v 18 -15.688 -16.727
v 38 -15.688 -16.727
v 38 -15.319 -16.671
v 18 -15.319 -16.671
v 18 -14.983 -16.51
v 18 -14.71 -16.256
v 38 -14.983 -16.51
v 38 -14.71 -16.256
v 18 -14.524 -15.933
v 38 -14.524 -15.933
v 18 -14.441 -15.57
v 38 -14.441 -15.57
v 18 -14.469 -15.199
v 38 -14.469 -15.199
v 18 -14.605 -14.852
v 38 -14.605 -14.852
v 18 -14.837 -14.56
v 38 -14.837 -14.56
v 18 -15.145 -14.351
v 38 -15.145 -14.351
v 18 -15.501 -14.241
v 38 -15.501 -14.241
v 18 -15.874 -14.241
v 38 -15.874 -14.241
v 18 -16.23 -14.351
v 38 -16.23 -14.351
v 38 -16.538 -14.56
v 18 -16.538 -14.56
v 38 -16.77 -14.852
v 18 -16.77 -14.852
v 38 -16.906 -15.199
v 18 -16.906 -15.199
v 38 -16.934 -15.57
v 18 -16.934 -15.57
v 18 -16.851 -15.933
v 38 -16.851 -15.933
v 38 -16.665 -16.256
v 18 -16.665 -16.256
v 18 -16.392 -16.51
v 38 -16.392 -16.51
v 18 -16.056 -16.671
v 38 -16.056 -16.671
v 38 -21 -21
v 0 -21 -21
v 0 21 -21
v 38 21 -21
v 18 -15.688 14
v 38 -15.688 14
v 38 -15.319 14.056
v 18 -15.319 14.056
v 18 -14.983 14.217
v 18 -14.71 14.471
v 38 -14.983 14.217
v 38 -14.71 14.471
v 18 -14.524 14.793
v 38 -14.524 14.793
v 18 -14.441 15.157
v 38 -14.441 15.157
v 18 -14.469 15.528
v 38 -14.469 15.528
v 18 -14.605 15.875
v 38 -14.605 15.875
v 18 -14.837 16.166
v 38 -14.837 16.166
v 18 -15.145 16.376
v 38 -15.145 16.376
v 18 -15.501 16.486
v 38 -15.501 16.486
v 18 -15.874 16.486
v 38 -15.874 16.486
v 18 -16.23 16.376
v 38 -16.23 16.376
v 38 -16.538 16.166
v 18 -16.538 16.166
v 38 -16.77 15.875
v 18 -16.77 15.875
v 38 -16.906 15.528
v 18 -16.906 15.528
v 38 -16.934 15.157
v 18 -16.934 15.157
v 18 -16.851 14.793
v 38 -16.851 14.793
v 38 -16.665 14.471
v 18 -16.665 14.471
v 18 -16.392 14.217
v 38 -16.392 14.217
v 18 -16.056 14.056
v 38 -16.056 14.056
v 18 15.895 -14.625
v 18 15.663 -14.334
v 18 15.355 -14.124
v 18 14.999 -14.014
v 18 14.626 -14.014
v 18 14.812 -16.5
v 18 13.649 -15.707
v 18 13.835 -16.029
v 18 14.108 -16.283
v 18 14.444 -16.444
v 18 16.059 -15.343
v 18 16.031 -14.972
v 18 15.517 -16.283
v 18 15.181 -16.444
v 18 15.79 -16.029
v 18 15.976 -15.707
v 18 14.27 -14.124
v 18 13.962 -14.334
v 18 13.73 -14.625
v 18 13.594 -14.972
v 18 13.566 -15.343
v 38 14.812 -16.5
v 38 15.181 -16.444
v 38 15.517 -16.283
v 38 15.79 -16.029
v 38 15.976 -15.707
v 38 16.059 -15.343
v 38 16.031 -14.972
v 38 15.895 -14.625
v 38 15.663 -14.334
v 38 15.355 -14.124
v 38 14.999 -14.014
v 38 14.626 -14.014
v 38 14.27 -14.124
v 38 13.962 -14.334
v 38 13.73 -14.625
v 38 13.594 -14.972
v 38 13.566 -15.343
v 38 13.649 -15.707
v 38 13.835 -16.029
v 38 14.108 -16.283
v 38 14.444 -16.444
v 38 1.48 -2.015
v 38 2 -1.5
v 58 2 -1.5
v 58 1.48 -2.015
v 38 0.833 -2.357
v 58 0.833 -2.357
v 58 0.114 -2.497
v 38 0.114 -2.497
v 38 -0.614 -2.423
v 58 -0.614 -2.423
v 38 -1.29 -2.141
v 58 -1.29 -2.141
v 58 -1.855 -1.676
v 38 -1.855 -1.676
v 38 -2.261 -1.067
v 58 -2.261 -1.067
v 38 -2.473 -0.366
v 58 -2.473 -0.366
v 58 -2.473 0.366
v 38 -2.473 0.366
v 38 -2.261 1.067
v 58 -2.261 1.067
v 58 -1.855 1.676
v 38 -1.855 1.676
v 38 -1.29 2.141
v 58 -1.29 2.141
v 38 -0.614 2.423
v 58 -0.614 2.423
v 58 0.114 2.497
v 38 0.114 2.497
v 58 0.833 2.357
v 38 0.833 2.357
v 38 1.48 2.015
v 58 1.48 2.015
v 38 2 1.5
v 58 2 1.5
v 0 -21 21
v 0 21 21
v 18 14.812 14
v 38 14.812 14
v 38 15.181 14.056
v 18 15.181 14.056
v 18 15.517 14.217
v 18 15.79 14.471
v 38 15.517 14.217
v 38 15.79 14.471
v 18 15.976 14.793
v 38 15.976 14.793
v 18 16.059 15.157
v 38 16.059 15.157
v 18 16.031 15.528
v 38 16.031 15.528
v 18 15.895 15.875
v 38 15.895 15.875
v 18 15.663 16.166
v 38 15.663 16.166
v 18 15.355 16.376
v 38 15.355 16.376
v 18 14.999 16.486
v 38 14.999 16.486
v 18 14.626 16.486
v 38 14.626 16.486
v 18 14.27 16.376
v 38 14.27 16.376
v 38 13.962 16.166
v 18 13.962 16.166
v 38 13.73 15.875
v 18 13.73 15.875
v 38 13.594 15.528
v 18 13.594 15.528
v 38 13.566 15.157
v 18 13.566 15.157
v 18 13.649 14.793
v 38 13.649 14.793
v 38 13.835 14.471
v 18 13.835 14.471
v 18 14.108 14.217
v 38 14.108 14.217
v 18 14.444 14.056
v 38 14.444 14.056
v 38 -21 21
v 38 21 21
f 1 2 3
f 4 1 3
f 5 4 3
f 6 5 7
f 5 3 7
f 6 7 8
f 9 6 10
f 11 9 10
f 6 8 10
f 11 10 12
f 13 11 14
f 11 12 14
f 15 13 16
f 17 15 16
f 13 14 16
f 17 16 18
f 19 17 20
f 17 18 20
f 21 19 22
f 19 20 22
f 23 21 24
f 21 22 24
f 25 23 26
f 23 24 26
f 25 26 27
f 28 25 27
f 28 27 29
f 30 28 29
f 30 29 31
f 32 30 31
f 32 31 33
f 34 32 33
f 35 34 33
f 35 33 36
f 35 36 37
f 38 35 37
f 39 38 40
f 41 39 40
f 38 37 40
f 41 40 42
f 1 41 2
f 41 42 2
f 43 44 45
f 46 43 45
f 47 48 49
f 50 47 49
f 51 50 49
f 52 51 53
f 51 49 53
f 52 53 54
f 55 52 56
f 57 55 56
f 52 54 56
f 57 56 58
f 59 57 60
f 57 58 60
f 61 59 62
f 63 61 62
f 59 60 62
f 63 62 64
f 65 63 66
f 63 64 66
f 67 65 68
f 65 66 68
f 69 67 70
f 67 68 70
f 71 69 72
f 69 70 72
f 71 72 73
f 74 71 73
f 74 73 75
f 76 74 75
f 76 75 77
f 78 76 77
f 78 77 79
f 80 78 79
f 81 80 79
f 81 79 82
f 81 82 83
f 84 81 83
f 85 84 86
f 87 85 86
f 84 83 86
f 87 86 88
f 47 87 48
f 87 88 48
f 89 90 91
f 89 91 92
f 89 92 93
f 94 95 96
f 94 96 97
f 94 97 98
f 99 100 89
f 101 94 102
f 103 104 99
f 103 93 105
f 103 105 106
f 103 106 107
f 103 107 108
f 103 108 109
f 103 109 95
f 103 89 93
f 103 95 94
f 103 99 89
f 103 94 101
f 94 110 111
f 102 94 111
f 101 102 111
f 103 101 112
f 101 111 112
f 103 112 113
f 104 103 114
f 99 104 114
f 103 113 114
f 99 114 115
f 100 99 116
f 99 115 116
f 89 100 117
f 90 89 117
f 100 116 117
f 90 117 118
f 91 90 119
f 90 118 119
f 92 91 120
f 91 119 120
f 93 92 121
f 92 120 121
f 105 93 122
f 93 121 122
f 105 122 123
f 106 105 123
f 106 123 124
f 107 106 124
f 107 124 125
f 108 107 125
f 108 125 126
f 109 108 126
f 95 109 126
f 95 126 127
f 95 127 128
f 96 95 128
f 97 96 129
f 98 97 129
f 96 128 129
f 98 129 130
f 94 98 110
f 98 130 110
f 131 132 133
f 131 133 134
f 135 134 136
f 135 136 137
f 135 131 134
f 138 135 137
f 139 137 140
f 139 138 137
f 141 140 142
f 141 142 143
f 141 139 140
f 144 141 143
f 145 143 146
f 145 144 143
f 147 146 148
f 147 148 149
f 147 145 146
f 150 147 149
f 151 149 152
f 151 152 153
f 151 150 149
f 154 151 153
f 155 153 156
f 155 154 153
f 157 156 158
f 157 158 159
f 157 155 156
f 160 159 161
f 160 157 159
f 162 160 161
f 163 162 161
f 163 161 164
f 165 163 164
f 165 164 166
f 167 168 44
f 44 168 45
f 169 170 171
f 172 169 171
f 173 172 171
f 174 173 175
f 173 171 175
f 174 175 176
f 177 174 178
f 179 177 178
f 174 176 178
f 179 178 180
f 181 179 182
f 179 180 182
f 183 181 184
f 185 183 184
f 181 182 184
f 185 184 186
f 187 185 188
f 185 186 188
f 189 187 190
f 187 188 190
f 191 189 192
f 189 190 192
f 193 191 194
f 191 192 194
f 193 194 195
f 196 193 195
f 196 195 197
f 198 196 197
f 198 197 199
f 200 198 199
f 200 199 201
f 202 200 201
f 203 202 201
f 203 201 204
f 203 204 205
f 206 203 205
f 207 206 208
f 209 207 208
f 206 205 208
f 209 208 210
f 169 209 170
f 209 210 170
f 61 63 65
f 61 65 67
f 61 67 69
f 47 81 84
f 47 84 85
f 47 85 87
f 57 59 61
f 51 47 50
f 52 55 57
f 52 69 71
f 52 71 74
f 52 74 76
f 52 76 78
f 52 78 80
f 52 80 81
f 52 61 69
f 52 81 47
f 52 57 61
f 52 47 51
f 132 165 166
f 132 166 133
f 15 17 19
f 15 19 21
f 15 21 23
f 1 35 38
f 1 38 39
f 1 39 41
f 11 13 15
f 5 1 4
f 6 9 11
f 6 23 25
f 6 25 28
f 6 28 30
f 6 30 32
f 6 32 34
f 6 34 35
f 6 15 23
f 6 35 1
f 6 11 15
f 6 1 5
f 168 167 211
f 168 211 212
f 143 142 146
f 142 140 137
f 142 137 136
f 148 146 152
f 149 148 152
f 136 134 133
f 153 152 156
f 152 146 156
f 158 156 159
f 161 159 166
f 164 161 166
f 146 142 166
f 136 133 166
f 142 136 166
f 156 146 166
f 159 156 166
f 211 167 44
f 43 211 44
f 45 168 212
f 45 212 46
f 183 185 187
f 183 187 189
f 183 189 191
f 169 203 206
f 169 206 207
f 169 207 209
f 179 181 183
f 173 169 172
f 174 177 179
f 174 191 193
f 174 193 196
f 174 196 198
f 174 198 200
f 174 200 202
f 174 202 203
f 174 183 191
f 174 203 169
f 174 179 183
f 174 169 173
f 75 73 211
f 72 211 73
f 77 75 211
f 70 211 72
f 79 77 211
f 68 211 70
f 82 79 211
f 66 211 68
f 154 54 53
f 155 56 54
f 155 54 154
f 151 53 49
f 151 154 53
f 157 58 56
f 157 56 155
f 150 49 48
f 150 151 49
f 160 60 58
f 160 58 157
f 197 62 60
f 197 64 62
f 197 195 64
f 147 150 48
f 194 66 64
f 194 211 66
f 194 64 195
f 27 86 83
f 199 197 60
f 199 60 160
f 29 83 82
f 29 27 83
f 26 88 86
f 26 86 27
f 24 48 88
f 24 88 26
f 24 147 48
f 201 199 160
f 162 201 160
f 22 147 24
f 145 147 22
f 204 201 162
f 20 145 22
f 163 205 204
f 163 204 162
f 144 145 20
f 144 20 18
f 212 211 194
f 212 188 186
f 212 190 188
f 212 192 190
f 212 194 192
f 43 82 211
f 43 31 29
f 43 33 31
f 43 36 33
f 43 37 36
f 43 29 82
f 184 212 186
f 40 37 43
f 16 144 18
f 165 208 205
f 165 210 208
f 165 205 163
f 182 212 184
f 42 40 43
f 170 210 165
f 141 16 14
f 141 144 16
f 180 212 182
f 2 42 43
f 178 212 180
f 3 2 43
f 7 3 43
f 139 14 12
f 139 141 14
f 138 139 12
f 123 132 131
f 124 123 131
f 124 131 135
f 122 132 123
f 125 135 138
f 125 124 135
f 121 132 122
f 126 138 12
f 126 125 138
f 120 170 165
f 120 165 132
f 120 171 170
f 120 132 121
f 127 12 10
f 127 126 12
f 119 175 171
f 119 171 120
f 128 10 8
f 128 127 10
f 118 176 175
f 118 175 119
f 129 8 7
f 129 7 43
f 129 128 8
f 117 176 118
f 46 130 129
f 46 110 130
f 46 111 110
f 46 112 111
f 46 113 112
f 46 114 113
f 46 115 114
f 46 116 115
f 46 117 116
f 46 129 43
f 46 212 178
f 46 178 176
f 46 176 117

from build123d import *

# Parameters (mm, degrees)
SKETCH_1_W          = 42
SKETCH_1_H          = 42
EXTRUDE_1_DEPTH     = 38
EXTRUDE_2_DEPTH     = 20
SKETCH_3_R          = 1.25
CUT_EXTRUDE_1_DEPTH = 20


with BuildPart() as part:
    # 草图1 → 凸台-拉伸1 (new body)
    with BuildSketch(Plane(origin=(0, 0, 0), x_dir=(0, 0, -1), z_dir=(1, 0, 0))):
        Rectangle(SKETCH_1_W, SKETCH_1_H)
    extrude(amount=EXTRUDE_1_DEPTH)

    # 草图2 → 凸台-拉伸2 (add)
    with BuildSketch(Plane(origin=(38, 0, 0), x_dir=(0, 0, -1), z_dir=(1, 0, 0))):
        with BuildLine():
            Line((-1.5, 2), (1.5, 2))
            ThreePointArc((1.5, 2), (0, -2.5), (-1.5, 2))
        make_face()
    extrude(amount=EXTRUDE_2_DEPTH)

    # 草图3 → 切除-拉伸1 (cut)
    with BuildSketch(Plane(origin=(38, 0, 0), x_dir=(0, 0, -1), z_dir=(1, 0, 0))):
        with Locations((-15.25, 14.812372141)):
            Circle(SKETCH_3_R)
        with Locations((15.25, 14.812372141)):
            Circle(SKETCH_3_R)
        with Locations((15.476779335, -15.687627859)):
            Circle(SKETCH_3_R)
        with Locations((-15.25, -15.687627859)):
            Circle(SKETCH_3_R)
    extrude(amount=-CUT_EXTRUDE_1_DEPTH, mode=Mode.SUBTRACT)


solid = part.part
